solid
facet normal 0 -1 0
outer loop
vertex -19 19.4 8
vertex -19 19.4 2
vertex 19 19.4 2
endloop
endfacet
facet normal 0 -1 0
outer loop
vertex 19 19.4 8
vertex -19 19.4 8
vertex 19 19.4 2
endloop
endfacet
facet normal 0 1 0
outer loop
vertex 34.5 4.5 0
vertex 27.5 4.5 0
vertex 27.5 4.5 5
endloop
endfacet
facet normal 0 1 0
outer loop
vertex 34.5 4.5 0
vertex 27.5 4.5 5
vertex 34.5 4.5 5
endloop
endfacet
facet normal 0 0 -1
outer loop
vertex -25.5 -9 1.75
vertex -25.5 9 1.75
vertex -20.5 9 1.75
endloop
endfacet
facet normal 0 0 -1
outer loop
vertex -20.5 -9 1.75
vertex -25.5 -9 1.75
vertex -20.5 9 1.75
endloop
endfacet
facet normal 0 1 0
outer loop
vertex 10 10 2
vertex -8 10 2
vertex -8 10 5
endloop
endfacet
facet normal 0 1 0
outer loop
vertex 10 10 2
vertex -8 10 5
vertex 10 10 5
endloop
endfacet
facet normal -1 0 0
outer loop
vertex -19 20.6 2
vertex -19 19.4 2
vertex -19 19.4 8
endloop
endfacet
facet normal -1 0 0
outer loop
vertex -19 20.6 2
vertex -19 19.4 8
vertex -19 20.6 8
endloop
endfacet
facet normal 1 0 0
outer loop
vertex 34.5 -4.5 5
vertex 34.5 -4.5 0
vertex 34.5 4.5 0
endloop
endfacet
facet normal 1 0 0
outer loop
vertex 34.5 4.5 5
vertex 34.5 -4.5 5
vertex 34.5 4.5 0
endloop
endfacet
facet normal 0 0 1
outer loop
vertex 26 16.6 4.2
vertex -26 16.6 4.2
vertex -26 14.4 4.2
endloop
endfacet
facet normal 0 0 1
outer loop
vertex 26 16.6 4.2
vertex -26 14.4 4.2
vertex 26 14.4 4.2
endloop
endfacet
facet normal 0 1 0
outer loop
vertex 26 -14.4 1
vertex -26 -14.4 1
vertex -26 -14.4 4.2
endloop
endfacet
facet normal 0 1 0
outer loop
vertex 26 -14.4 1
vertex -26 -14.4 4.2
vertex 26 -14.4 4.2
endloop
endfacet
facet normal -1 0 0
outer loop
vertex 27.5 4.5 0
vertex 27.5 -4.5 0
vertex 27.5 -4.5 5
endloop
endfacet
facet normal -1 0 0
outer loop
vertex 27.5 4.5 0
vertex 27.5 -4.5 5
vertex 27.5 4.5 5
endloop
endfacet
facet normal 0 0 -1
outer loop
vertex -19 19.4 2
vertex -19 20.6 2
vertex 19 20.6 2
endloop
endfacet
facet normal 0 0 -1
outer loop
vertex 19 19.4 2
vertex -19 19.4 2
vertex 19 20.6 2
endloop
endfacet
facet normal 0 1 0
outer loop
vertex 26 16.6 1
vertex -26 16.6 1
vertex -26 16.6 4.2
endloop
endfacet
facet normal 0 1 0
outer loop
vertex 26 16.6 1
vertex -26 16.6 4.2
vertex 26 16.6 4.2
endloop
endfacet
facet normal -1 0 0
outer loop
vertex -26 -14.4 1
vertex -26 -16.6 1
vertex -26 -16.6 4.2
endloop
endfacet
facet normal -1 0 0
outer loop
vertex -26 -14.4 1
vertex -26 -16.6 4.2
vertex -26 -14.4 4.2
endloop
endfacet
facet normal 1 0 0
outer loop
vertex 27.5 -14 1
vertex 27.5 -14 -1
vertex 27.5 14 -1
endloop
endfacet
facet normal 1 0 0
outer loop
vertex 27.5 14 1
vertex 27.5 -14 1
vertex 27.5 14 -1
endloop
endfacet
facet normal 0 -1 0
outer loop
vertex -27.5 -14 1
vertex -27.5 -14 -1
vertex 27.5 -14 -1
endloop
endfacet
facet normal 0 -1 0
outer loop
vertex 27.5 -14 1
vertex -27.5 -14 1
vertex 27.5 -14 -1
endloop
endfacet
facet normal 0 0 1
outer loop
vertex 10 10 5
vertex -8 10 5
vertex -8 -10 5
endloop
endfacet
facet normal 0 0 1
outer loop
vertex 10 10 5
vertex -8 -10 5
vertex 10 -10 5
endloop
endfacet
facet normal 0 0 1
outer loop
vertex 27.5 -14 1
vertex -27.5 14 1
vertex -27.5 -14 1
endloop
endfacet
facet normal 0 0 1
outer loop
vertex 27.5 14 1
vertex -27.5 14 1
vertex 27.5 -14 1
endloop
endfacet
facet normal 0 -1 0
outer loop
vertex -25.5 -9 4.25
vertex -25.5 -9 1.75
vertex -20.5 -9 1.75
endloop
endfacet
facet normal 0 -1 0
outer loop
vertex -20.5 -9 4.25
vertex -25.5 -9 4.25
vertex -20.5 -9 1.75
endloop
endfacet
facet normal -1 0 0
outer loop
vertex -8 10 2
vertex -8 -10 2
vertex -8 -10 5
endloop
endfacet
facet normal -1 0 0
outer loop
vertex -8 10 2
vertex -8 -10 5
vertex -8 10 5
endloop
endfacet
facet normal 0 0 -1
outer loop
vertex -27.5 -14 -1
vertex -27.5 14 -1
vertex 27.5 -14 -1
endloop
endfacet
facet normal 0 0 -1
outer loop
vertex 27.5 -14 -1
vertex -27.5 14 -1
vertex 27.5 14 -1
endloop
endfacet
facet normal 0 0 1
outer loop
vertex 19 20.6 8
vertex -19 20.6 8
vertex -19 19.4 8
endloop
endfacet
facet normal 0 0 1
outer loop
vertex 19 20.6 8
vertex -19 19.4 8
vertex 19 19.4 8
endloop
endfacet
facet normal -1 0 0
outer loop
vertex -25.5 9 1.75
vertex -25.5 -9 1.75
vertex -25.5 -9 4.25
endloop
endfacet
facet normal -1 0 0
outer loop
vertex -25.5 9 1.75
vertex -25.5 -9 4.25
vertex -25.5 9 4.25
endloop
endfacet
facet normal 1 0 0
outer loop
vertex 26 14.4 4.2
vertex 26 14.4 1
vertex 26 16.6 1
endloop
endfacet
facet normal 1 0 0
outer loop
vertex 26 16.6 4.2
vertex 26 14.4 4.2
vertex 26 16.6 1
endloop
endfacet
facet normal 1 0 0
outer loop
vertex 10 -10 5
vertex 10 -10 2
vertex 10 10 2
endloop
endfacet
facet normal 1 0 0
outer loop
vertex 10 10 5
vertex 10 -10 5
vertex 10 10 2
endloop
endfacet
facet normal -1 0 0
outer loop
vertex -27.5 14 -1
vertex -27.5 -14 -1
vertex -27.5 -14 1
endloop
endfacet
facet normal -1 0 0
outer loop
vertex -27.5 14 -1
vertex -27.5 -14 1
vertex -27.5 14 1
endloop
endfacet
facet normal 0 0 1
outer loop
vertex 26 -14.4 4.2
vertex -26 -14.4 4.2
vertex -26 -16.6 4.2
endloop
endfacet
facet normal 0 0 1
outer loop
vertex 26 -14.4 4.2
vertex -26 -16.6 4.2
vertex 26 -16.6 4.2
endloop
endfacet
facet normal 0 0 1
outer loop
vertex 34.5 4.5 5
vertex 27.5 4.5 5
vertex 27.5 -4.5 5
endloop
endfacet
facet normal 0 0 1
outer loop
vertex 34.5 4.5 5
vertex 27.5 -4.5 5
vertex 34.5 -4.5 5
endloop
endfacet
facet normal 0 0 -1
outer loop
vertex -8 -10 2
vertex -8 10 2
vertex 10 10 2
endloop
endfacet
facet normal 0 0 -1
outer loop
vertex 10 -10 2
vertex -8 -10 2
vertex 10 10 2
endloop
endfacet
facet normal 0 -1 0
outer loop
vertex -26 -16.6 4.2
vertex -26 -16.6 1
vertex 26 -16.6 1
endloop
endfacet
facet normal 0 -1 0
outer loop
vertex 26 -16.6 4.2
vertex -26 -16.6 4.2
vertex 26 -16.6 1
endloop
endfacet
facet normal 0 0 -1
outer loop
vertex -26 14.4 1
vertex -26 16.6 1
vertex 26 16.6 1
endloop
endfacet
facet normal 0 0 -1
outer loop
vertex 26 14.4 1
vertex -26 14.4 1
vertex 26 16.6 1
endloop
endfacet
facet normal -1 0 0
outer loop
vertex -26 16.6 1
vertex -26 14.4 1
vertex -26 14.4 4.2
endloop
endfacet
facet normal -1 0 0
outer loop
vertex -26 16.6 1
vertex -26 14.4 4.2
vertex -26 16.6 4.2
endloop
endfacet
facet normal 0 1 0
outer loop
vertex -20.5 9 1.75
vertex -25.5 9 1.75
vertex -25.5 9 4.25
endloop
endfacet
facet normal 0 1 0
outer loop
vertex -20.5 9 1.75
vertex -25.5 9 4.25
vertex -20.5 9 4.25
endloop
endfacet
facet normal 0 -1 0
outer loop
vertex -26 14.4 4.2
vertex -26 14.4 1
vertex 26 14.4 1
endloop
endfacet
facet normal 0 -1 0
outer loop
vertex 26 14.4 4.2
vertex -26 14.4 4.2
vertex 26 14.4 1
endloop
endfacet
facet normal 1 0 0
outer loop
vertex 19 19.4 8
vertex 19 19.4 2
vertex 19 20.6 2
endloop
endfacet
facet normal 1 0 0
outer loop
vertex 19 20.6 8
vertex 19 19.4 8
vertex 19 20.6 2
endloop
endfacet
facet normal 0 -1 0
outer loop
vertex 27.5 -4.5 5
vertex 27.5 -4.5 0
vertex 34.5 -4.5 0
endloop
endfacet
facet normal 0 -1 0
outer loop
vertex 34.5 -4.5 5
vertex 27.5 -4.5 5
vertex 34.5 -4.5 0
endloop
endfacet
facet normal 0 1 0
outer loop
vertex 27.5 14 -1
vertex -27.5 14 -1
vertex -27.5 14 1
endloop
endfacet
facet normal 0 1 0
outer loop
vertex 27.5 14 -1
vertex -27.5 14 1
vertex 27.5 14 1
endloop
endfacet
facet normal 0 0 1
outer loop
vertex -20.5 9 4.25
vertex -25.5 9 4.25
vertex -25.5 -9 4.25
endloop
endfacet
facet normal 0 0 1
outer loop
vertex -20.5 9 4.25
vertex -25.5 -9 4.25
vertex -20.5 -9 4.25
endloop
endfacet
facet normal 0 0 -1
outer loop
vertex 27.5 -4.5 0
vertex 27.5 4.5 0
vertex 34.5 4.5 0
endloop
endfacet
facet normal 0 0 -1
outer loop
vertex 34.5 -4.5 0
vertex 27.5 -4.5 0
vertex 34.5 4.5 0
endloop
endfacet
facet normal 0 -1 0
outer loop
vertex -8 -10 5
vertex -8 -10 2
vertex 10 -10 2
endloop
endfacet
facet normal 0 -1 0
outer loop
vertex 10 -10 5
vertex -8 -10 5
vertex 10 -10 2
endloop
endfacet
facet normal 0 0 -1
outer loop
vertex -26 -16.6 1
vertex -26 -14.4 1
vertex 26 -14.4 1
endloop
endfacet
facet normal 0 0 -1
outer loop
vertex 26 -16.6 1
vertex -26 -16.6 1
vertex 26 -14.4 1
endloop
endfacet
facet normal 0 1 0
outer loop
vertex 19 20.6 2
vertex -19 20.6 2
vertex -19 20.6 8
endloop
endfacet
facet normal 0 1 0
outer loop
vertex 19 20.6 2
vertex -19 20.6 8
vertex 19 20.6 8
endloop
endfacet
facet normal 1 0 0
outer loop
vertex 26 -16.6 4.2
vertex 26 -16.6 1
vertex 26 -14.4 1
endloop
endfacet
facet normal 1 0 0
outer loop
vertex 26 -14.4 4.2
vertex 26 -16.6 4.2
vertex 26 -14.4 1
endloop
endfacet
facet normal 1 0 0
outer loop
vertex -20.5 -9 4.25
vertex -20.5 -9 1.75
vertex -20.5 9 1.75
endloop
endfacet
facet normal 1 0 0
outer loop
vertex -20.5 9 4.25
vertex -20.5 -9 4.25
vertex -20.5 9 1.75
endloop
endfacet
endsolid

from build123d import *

# Parameters (mm, degrees)
ESP32_START                              = -1
SKETCH_1_W                               = 55
SKETCH_1_H                               = 28
ESP32_DEVKIT_PCB_APPROX_55_X_28_MM_DEPTH = 2
ESP_WROOM_START                          = 2
SKETCH_2_W                               = 18
SKETCH_2_H                               = 20
ESP_WROOM_SHIELD_CAN_DEPTH               = 3
SKETCH_3_W                               = 7
SKETCH_3_H                               = 9
MICRO_USB_CONNECTOR_DEPTH                = 5
RESET_START                              = 1.75
SKETCH_4_W                               = 5
SKETCH_4_H                               = 18
RESET_BOOT_BUTTON_PAIR_DEPTH             = 2.5
LEFT_START                               = 1
SKETCH_5_W                               = 52
SKETCH_5_H                               = 2.2
LEFT_PIN_HEADER_ROW_DEPTH                = 3.2
RIGHT_START                              = 1
SKETCH_6_W                               = 52
SKETCH_6_H                               = 2.2
RIGHT_PIN_HEADER_ROW_DEPTH               = 3.2
ESP32_START_2                            = 2
SKETCH_7_W                               = 38
SKETCH_7_H                               = 1.2
ESP32_LABEL_PLATE_ESP32_55X28_DEPTH      = 6


with BuildPart() as part:
    # 草图1 → ESP32 DevKit PCB - approx 55 x 28 mm (new body)
    with BuildSketch(Plane.XY.offset(ESP32_START)):
        Rectangle(SKETCH_1_W, SKETCH_1_H)
    extrude(amount=ESP32_DEVKIT_PCB_APPROX_55_X_28_MM_DEPTH)


with BuildPart() as body_2:
    # 草图2 → ESP-WROOM shield can (new body)
    with BuildSketch(Plane.XY.offset(ESP_WROOM_START)):
        with Locations((1, 0)):
            Rectangle(SKETCH_2_W, SKETCH_2_H)
    extrude(amount=ESP_WROOM_SHIELD_CAN_DEPTH)


with BuildPart() as body_3:
    # 草图3 → micro USB connector (new body)
    with BuildSketch(Plane.XY):
        with Locations((31, 0)):
            Rectangle(SKETCH_3_W, SKETCH_3_H)
    extrude(amount=MICRO_USB_CONNECTOR_DEPTH)


with BuildPart() as body_4:
    # 草图4 → reset / boot button pair (new body)
    with BuildSketch(Plane.XY.offset(RESET_START)):
        with Locations((-23, 0)):
            Rectangle(SKETCH_4_W, SKETCH_4_H)
    extrude(amount=RESET_BOOT_BUTTON_PAIR_DEPTH)


with BuildPart() as body_5:
    # 草图5 → left pin header row (new body)
    with BuildSketch(Plane.XY.offset(LEFT_START)):
        with Locations((0, -15.5)):
            Rectangle(SKETCH_5_W, SKETCH_5_H)
    extrude(amount=LEFT_PIN_HEADER_ROW_DEPTH)


with BuildPart() as body_6:
    # 草图6 → right pin header row (new body)
    with BuildSketch(Plane.XY.offset(RIGHT_START)):
        with Locations((0, 15.5)):
            Rectangle(SKETCH_6_W, SKETCH_6_H)
    extrude(amount=RIGHT_PIN_HEADER_ROW_DEPTH)


with BuildPart() as body_7:
    # 草图7 → esp32 label plate - ESP32 55x28 (new body)
    with BuildSketch(Plane.XY.offset(ESP32_START_2)):
        with Locations((0, 20)):
            Rectangle(SKETCH_7_W, SKETCH_7_H)
    extrude(amount=ESP32_LABEL_PLATE_ESP32_55X28_DEPTH)


solid = Compound([part.part, body_2.part, body_3.part, body_4.part, body_5.part, body_6.part, body_7.part])
